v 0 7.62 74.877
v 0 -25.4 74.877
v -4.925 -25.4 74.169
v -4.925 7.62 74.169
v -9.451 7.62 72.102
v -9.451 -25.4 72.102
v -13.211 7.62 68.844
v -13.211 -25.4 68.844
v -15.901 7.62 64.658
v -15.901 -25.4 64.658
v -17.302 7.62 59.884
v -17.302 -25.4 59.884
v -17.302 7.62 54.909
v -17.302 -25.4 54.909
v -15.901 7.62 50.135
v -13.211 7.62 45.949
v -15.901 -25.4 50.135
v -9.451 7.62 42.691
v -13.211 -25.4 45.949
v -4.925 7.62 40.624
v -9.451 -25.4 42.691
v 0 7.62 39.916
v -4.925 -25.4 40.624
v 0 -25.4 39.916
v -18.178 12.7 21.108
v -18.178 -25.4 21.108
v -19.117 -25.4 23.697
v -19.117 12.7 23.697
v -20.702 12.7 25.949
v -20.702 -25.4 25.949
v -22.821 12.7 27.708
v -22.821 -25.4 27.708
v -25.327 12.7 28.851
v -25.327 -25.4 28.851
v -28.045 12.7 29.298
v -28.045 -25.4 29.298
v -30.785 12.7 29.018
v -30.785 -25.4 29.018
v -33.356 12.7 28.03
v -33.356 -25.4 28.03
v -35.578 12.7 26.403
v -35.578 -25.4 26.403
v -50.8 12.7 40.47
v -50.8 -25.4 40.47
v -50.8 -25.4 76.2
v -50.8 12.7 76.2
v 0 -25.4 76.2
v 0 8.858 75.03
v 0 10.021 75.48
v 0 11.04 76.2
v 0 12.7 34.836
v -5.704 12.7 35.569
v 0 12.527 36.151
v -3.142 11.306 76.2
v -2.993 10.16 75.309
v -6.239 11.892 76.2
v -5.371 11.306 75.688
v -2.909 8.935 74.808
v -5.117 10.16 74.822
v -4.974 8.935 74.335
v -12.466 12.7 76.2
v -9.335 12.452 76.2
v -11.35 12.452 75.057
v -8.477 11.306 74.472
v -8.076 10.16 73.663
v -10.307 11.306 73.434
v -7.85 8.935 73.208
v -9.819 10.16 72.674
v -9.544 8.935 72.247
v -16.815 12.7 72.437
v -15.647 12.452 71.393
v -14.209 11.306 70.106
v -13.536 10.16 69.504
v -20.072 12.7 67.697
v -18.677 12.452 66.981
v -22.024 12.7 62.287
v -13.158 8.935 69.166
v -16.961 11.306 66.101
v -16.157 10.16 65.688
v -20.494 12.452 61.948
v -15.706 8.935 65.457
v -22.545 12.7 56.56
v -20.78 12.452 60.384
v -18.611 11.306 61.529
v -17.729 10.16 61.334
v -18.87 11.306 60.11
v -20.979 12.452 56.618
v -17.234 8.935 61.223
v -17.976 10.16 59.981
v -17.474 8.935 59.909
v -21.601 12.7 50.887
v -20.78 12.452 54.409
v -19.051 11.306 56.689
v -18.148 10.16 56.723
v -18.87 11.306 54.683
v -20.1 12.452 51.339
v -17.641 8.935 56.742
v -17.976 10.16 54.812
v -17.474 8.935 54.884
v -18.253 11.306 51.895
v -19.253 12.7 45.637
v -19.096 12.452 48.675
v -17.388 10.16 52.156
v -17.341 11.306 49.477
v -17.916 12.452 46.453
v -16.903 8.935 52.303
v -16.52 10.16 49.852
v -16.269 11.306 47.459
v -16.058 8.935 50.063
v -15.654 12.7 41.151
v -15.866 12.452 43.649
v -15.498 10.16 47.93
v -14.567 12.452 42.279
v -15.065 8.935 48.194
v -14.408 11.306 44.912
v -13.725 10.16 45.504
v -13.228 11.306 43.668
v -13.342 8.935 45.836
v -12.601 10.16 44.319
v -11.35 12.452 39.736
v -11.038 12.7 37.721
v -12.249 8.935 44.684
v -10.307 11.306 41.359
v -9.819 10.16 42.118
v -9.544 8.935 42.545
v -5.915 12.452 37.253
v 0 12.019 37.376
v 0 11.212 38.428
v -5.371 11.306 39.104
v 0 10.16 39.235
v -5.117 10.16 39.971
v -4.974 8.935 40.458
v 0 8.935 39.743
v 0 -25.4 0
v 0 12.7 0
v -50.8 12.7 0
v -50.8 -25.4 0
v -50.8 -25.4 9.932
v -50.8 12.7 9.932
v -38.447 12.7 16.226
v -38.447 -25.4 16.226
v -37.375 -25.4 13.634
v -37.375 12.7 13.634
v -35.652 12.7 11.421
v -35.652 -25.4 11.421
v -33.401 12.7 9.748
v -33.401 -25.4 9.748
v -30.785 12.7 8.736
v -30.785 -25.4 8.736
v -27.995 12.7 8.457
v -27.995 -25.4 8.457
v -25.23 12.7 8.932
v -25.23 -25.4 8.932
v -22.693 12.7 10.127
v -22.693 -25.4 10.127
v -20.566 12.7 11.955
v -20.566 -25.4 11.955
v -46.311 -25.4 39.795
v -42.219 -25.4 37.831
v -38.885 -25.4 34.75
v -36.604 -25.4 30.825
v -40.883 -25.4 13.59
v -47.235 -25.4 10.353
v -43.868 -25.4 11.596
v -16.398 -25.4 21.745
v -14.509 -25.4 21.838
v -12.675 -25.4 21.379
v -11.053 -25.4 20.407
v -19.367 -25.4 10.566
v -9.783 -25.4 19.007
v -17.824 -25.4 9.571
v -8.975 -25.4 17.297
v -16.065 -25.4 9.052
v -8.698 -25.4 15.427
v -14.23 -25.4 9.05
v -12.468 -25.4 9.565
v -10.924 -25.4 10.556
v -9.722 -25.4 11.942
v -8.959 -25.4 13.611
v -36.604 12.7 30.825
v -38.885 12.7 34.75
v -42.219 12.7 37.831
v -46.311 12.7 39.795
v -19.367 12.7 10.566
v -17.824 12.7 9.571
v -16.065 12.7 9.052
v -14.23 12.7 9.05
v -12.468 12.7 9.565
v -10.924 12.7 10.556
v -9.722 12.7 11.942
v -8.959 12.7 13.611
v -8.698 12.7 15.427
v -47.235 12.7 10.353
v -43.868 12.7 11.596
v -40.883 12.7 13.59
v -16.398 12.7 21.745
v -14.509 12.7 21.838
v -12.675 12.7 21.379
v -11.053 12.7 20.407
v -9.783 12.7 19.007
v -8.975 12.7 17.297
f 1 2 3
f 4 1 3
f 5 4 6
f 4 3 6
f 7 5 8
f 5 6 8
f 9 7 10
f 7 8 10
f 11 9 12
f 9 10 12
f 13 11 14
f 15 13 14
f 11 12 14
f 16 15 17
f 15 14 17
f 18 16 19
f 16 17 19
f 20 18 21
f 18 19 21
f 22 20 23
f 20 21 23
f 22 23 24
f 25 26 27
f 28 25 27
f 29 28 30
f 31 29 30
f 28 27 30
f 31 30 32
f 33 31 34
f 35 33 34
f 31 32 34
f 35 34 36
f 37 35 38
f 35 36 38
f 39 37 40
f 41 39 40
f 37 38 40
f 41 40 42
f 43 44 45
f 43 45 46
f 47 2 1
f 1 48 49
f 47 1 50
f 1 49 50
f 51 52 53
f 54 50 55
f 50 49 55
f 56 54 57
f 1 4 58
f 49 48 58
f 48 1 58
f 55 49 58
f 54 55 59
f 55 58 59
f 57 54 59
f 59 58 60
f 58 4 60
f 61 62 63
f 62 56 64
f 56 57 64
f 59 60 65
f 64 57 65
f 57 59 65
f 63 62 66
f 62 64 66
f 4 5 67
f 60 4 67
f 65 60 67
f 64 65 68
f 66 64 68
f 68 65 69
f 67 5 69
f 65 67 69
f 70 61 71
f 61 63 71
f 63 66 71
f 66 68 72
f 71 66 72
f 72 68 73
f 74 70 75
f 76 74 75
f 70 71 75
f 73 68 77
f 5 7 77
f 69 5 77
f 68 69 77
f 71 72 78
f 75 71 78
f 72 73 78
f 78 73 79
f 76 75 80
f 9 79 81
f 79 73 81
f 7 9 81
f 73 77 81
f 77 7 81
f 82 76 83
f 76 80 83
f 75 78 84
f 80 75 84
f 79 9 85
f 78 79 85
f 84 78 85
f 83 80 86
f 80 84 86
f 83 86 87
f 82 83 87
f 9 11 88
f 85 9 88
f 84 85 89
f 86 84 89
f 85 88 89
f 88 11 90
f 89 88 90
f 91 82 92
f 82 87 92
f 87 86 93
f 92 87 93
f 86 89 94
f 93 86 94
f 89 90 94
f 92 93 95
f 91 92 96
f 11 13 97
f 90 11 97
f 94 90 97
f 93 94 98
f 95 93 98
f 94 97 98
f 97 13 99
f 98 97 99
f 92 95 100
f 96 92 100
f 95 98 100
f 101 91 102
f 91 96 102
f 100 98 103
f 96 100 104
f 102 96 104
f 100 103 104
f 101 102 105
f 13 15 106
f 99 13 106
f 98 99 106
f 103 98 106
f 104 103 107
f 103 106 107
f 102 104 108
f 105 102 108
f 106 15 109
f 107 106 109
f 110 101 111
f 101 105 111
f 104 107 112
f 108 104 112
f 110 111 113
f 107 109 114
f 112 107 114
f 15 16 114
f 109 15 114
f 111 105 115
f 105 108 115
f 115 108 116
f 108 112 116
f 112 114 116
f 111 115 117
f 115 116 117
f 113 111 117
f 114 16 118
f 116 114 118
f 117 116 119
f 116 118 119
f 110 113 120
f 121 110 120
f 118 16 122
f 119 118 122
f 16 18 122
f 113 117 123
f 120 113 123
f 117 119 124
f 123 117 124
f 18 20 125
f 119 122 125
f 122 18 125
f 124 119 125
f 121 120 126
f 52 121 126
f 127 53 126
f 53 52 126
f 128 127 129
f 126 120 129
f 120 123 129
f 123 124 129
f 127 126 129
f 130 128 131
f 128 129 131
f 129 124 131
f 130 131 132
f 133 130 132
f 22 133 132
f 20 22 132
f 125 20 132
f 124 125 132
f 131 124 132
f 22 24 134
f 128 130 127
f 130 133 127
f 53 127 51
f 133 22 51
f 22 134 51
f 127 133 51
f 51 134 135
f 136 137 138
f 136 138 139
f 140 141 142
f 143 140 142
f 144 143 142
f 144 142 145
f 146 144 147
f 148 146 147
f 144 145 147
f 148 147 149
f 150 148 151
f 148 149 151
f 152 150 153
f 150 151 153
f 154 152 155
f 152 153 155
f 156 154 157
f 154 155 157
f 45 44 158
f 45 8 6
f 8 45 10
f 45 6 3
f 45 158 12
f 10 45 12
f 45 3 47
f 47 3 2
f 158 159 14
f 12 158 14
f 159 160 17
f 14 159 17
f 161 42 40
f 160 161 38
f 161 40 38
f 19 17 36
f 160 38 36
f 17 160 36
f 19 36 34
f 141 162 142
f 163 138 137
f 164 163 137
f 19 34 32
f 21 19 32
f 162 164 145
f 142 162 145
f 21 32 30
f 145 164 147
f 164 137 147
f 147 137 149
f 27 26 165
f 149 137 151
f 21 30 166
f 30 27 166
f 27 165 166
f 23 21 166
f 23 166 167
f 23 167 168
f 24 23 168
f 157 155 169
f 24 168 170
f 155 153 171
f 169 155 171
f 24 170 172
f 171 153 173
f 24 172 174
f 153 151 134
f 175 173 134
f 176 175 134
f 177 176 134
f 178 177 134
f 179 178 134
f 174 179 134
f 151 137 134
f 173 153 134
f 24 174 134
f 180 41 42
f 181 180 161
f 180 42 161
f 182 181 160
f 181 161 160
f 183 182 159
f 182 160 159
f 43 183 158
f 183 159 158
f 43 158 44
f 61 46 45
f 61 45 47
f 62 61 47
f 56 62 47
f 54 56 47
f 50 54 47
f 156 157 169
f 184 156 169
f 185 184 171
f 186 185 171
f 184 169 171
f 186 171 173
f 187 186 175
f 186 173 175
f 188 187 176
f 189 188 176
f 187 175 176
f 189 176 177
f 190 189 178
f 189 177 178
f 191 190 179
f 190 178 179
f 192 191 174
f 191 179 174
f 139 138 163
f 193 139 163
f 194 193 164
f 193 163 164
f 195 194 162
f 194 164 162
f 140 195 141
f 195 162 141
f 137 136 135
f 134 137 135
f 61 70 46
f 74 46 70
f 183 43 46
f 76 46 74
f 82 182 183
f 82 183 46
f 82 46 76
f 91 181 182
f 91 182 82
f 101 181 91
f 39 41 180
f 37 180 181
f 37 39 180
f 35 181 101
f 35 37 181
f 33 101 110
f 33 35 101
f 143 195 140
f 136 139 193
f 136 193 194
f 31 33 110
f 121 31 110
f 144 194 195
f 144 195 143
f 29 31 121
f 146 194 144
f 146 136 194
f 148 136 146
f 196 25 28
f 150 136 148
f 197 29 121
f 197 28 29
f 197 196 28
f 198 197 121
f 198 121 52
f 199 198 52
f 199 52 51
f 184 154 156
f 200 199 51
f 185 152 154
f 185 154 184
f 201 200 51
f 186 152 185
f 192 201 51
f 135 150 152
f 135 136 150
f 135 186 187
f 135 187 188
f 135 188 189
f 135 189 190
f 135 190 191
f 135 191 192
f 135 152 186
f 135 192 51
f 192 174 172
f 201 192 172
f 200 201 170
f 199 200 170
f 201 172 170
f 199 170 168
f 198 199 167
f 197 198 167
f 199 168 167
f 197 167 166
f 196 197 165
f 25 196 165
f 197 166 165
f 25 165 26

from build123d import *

# Parameters (mm, degrees)
F0_W     = 50.8
F0_H     = 38.1
F1_DEPTH = 76.2
F2_R     = 17.4803225392
F3_DEPTH = 38.101
F4_R     = 5.08


with BuildPart() as f1:
    # F0 (on Top) → F1 (new body)
    with BuildSketch(Plane.XY):
        with Locations((-25.4, -6.35)):
            Rectangle(F0_W, F0_H)
    extrude(amount=F1_DEPTH)

    # F2 (on face) → F3 (cut, through all)
    with BuildSketch(Plane.XZ.offset(25.4)):
        with BuildLine():
            ThreePointArc((-38.4466977771, 16.2261378818), (-36.2780752576, 20.4825429519), (-35.530821321, 25.2007544041))
            ThreePointArc((-35.530821321, 25.2007544041), (-35.5426781239, 25.802374467), (-35.5782301185, 26.4030601914))
            ThreePointArc((-35.5782301185, 26.4030601914), (-38.3981973117, 21.7051818884), (-38.4466977771, 16.2261378818))
        make_face()
        with BuildLine():
            ThreePointArc((-35.5782301185, 26.4030601914), (-35.5426781239, 25.802374467), (-35.530821321, 25.2007544041))
            ThreePointArc((-35.530821321, 25.2007544041), (-36.2780752576, 20.4825429519), (-38.4466977771, 16.2261378818))
            ThreePointArc((-38.4466977771, 16.2261378818), (-30.7853938644, 8.7355753596), (-20.5657055583, 11.9545931397))
            ThreePointArc((-20.5657055583, 11.9545931397), (-21.3730987717, 17.05320374), (-18.1779448175, 21.1076710371))
            ThreePointArc((-18.1779448175, 21.1076710371), (-25.3272484905, 28.8513160491), (-35.5782301185, 26.4030601914))
        make_face()
        with BuildLine():
            ThreePointArc((-38.4466977771, 16.2261378818), (-38.3981973117, 21.7051818884), (-35.5782301185, 26.4030601914))
            ThreePointArc((-35.5782301185, 26.4030601914), (-65.4965501841, 29.3431245248), (-38.4466977771, 16.2261378818))
        make_face()
        with BuildLine():
            ThreePointArc((-8.6975224724, 15.4270771891), (-11.8284701462, 20.9530964233), (-18.1779448175, 21.1076710371))
            ThreePointArc((-18.1779448175, 21.1076710371), (-17.9969955306, 19.9986578535), (-17.9364446703, 18.8766121864))
            ThreePointArc((-17.9364446703, 18.8766121864), (-18.6158988239, 15.1743371933), (-20.5657055583, 11.9545931397))
            ThreePointArc((-20.5657055583, 11.9545931397), (-13.3305831879, 9.2441993148), (-8.6975224724, 15.4270771891))
        make_face()
        with BuildLine():
            ThreePointArc((-17.9364446703, 18.8766121864), (-17.9969955306, 19.9986578535), (-18.1779448175, 21.1076710371))
            ThreePointArc((-18.1779448175, 21.1076710371), (-21.3730987717, 17.05320374), (-20.5657055583, 11.9545931397))
            ThreePointArc((-20.5657055583, 11.9545931397), (-18.6158988239, 15.1743371933), (-17.9364446703, 18.8766121864))
        make_face()
        with Locations((0, 57.3963969946)):
            Circle(F2_R)
    extrude(amount=-F3_DEPTH, mode=Mode.SUBTRACT)

    # F4
    f4_edges = [f1.edges().sort_by_distance(p)[0] for p in [
        (-17.480323, 12.7, 57.396397),
    ]]
    fillet(f4_edges, radius=F4_R)


solid = f1.part
